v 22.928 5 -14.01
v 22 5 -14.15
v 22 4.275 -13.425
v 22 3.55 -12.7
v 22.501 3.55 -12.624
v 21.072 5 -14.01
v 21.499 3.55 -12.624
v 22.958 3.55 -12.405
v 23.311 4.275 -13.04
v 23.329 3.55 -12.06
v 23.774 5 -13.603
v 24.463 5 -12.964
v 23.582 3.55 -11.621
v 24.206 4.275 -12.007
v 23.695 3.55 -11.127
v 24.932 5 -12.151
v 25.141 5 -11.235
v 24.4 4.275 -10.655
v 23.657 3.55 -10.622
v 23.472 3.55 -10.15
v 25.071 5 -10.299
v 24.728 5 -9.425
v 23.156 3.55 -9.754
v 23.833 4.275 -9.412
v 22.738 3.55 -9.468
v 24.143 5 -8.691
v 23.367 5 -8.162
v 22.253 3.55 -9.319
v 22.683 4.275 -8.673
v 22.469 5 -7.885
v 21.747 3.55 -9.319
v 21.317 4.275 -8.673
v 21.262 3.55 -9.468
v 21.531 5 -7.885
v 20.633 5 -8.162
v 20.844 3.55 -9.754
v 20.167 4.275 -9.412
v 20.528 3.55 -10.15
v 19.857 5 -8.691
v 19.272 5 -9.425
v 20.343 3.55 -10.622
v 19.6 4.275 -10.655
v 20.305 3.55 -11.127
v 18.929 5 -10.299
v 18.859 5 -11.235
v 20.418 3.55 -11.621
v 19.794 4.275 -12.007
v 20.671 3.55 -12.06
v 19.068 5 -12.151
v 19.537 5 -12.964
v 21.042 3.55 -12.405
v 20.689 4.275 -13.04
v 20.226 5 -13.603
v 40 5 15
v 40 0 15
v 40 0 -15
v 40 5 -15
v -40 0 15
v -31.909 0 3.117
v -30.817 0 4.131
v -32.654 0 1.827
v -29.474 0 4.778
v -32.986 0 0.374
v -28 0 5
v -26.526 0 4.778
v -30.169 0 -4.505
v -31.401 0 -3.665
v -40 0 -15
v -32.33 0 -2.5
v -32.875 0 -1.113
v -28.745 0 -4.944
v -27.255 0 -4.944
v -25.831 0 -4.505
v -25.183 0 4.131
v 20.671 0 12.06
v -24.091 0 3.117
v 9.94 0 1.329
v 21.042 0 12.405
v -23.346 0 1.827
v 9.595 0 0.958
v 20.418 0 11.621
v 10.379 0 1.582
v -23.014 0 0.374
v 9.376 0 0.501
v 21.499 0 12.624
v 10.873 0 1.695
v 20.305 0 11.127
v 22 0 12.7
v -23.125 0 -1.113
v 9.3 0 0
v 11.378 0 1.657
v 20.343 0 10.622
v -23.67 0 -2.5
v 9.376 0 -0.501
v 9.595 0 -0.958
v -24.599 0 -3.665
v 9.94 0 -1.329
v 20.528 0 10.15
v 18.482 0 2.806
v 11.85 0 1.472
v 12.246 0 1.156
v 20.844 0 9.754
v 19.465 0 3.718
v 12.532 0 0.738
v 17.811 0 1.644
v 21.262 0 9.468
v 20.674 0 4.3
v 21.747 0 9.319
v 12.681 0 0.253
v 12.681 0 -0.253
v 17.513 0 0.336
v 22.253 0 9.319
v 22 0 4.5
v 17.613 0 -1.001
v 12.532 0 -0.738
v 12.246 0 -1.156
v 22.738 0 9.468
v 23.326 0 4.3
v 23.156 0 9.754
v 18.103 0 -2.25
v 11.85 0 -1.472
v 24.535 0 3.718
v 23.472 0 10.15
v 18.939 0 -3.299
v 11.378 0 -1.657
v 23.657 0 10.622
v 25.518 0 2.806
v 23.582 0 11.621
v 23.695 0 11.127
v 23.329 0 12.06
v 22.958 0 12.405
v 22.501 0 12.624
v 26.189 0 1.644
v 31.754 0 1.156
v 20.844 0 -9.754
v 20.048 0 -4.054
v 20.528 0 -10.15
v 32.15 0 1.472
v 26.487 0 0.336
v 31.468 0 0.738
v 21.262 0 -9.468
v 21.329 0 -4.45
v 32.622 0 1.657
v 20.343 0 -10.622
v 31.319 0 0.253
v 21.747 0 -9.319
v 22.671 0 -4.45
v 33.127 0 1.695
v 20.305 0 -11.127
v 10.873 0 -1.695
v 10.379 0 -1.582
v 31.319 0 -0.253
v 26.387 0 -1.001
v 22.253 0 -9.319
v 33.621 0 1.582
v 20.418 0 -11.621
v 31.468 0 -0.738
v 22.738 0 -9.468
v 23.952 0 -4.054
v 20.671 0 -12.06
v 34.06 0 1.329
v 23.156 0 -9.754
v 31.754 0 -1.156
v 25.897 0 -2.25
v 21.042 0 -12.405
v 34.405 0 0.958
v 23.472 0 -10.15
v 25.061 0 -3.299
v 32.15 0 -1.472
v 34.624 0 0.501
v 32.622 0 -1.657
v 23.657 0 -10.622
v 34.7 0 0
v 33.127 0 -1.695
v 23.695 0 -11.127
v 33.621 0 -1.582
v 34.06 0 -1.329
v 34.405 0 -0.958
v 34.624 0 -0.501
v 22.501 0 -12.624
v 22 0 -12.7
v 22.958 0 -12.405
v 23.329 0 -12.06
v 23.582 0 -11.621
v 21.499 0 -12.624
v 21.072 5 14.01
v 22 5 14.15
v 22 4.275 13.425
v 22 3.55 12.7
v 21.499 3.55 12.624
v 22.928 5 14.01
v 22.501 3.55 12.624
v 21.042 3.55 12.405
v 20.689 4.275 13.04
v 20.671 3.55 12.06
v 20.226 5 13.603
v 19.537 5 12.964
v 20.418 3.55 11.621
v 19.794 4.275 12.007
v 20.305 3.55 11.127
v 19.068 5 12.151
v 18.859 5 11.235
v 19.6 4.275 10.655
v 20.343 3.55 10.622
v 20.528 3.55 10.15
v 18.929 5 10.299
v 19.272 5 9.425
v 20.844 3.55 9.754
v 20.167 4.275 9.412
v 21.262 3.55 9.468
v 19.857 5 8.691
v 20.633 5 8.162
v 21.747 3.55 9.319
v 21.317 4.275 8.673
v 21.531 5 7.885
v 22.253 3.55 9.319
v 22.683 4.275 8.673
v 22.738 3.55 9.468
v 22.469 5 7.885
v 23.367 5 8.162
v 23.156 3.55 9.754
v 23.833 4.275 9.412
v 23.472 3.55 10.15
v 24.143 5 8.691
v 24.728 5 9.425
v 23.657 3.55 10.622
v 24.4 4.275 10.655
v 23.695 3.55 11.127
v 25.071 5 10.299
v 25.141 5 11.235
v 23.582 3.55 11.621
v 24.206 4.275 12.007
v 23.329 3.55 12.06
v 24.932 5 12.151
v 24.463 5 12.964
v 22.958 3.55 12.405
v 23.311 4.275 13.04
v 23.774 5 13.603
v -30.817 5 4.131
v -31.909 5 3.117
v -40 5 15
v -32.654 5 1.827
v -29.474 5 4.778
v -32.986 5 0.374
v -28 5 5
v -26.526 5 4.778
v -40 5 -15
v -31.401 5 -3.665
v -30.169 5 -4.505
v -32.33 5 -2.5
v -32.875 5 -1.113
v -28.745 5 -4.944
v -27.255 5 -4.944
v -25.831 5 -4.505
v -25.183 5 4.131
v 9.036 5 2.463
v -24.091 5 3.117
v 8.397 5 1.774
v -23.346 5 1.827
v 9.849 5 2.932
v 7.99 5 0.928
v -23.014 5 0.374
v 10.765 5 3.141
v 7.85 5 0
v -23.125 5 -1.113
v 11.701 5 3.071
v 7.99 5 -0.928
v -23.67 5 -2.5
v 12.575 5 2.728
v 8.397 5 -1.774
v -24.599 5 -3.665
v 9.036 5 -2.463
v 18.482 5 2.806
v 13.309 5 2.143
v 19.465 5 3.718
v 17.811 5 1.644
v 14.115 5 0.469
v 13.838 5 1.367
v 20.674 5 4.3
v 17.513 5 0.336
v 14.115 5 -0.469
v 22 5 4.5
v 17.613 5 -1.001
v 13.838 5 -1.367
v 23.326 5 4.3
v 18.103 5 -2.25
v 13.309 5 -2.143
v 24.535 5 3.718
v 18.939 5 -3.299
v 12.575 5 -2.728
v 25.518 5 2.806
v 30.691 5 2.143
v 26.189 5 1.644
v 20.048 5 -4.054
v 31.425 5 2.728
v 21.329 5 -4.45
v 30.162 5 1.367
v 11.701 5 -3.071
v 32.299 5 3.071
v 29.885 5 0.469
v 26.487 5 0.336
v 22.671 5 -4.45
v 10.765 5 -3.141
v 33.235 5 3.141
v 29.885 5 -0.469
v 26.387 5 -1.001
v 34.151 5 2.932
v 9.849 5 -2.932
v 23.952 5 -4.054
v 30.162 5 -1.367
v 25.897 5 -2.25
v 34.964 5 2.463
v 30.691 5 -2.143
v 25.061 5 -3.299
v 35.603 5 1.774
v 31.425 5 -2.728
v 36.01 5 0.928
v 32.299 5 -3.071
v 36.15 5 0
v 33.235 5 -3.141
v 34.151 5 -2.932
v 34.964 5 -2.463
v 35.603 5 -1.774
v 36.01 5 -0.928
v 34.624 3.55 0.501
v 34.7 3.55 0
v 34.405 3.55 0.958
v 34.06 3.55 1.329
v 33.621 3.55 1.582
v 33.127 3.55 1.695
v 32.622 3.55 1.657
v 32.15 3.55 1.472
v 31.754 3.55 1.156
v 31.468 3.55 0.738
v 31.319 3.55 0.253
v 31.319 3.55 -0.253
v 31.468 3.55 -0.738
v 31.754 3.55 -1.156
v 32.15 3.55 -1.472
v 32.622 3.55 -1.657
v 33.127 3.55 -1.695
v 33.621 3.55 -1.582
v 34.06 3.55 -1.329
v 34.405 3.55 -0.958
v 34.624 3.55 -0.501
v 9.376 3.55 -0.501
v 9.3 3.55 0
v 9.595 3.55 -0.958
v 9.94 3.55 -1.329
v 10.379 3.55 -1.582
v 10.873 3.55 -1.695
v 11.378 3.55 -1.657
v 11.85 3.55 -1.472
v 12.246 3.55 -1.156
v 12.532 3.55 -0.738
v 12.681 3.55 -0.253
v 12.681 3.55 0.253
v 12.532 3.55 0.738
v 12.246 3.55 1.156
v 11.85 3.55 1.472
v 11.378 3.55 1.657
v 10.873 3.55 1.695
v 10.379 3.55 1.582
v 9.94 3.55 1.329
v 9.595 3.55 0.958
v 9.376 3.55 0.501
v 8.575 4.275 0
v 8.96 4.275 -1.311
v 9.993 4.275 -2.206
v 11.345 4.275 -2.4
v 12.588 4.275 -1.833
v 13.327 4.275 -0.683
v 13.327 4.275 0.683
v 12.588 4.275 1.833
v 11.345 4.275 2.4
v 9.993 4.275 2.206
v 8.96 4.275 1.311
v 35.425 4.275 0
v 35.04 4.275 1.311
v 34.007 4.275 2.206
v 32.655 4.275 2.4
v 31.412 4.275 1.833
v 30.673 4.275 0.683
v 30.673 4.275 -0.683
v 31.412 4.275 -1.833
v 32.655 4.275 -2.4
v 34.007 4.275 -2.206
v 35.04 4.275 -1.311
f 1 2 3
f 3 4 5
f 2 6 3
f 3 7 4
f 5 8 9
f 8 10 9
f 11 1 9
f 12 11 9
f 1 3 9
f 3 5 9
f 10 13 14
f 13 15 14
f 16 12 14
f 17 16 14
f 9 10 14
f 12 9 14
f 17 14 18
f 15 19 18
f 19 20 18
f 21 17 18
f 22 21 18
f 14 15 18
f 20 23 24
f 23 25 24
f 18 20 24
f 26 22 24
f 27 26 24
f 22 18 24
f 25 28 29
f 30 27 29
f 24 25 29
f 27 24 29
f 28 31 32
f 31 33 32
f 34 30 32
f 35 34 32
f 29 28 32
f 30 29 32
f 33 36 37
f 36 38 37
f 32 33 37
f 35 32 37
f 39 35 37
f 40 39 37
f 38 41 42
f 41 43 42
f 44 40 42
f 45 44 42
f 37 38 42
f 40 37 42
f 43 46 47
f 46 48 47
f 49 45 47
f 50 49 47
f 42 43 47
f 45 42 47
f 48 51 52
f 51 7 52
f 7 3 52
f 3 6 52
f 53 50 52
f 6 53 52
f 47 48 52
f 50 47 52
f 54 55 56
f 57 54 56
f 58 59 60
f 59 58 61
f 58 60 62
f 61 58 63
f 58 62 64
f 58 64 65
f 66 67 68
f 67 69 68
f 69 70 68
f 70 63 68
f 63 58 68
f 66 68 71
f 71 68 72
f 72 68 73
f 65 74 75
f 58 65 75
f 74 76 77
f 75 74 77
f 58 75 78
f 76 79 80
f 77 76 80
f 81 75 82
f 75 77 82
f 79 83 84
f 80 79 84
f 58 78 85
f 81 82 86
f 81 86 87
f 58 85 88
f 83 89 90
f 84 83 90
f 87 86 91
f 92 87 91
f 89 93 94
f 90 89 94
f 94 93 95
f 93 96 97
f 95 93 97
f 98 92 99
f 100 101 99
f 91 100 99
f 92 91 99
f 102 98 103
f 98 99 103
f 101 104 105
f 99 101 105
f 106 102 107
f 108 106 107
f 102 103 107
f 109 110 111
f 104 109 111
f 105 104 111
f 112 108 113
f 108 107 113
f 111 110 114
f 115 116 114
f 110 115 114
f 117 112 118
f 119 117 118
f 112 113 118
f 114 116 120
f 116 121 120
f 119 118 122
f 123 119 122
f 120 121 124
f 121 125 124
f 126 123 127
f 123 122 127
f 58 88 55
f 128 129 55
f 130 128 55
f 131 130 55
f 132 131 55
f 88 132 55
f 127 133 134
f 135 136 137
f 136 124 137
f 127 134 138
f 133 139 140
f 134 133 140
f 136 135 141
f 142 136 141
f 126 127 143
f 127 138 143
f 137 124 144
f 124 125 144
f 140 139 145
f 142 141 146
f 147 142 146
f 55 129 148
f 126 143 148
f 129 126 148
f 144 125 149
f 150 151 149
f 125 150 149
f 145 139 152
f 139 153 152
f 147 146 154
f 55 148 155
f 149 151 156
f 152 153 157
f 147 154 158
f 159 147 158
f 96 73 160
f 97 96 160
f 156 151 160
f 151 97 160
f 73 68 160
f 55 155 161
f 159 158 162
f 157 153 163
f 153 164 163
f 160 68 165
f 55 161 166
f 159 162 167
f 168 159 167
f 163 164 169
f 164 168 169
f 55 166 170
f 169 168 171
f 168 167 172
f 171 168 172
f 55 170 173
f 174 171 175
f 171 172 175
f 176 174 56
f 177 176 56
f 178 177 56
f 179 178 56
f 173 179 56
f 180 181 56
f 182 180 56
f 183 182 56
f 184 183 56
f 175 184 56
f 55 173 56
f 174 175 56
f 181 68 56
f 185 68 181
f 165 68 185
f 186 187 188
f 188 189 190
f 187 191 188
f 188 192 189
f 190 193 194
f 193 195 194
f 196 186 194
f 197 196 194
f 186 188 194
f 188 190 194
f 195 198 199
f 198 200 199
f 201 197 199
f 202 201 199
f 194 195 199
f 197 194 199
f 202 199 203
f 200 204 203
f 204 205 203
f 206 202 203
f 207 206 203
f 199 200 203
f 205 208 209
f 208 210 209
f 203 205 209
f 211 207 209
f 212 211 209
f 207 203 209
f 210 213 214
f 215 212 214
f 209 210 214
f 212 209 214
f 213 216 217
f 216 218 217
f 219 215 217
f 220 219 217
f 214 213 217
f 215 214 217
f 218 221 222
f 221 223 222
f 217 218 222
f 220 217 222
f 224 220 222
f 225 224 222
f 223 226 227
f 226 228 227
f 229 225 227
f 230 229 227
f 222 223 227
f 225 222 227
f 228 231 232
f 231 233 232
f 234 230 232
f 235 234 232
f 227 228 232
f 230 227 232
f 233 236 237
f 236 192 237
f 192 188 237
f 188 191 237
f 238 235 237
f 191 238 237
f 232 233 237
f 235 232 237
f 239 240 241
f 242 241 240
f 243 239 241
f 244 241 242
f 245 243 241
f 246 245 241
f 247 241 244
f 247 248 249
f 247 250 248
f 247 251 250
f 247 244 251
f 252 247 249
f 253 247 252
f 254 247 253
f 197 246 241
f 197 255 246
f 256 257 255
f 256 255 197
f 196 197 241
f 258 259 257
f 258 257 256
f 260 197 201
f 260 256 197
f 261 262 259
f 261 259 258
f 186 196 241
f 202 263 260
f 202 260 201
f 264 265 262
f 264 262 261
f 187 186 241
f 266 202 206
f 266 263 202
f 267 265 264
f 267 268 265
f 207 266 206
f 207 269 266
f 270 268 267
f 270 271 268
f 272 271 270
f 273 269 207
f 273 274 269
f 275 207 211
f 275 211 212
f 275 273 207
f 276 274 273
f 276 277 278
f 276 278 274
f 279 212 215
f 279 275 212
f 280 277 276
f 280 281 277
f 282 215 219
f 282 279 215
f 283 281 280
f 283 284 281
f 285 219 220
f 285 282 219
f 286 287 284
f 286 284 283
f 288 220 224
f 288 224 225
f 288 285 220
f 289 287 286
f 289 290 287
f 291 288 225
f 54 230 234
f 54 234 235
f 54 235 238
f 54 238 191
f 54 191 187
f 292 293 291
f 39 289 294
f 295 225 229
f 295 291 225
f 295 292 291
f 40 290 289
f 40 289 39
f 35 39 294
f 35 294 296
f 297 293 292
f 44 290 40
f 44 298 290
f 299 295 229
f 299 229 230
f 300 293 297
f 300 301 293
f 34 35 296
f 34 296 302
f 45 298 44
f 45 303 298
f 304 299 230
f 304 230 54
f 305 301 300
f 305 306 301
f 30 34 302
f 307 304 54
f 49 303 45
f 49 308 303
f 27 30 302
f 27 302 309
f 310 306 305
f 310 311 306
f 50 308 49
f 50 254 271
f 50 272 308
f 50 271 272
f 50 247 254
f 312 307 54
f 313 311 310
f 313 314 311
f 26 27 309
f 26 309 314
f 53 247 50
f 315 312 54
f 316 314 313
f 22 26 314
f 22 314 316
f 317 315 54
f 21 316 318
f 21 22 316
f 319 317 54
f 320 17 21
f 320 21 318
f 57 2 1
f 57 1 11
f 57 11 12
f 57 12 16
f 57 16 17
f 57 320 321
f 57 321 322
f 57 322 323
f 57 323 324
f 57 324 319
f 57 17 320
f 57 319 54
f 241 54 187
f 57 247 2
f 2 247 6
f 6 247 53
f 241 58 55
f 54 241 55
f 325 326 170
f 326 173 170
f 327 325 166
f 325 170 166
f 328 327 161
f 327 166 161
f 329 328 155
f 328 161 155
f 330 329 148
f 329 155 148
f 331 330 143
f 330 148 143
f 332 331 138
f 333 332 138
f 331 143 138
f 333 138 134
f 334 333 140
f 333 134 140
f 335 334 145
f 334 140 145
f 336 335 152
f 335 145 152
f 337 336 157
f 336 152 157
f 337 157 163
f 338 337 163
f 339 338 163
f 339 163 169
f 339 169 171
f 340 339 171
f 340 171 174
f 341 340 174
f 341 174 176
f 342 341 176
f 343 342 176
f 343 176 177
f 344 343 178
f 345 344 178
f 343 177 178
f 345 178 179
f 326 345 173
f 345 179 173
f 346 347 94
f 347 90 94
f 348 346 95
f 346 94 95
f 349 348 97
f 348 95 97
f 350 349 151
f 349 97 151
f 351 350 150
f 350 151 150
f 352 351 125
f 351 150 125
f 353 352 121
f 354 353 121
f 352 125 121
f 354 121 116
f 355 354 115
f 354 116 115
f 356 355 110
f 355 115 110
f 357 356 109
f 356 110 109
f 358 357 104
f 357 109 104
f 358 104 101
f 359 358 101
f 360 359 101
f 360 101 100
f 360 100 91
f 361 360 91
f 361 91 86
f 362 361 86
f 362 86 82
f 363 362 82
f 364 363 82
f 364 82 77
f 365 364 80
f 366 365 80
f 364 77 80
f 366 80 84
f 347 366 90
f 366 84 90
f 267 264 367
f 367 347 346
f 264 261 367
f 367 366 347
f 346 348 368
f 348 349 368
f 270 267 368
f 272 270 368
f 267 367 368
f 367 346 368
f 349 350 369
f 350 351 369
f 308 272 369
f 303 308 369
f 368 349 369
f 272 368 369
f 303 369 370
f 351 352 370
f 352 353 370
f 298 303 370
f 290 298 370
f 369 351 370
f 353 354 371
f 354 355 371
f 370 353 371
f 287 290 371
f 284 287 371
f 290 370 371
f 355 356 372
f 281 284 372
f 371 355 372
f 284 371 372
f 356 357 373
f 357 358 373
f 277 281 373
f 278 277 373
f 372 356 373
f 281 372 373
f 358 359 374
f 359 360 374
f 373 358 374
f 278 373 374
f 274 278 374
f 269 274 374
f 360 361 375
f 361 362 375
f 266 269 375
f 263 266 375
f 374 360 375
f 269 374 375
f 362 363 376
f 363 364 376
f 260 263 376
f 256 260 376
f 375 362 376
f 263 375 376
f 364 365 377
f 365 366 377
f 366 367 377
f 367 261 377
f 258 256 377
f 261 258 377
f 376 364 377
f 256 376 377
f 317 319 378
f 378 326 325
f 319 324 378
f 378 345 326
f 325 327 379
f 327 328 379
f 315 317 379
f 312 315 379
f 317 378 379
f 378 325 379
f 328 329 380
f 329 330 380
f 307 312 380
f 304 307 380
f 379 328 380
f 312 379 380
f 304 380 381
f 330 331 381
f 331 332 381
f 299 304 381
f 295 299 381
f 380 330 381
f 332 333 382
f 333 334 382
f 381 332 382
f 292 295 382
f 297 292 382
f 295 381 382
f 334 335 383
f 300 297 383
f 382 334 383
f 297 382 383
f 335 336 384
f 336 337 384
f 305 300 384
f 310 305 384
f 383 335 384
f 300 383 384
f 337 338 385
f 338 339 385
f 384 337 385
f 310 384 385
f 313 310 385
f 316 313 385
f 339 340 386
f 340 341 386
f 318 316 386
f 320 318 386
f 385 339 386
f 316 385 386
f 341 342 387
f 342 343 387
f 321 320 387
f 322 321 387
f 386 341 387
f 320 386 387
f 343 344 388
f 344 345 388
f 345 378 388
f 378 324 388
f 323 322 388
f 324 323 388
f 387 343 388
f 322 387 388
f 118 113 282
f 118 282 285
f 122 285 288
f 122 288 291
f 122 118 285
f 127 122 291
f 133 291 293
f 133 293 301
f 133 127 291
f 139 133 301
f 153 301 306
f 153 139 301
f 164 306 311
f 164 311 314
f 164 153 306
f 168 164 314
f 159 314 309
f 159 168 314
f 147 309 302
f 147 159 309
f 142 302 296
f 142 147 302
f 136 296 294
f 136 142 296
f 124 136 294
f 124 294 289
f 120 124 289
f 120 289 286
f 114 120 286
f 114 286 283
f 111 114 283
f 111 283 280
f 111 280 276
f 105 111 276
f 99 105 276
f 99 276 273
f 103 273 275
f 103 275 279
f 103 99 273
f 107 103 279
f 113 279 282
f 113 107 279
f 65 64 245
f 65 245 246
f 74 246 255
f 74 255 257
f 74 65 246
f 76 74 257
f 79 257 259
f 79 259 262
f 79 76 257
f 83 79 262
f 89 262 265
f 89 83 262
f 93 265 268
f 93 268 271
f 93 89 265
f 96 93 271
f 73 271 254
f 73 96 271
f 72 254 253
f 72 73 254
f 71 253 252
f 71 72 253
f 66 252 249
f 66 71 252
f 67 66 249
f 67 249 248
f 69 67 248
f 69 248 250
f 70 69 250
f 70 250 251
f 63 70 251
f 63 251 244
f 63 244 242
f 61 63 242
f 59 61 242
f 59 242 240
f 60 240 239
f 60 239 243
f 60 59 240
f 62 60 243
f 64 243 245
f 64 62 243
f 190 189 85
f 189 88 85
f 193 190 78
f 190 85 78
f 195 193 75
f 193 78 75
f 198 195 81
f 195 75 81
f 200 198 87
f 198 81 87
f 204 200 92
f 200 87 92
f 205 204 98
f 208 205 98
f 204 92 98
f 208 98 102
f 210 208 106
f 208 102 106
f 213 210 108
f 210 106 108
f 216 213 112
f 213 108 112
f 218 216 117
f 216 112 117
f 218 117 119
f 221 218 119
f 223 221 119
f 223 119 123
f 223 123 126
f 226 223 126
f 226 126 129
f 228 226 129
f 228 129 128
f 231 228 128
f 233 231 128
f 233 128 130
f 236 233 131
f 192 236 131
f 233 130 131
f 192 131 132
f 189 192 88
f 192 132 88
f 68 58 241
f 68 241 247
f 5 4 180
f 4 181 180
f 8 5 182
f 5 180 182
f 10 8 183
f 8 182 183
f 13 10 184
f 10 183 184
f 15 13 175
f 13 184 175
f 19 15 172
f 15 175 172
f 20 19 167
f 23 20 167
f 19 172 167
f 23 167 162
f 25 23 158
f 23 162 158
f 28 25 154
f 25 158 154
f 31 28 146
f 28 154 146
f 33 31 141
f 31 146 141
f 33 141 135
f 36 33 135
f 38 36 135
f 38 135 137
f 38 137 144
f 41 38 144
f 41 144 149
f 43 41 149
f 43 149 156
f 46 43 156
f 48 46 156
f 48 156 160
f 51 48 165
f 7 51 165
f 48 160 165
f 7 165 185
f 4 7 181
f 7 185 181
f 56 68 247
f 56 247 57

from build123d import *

# Parameters (mm, degrees)
SKETCH1_W                                           = 80
SKETCH1_H                                           = 30
SKETCH1_R                                           = 4.5
SKETCH1_R_2                                         = 5
BOSS_EXTRUDE1_DEPTH                                 = 5
CSK_FOR_M3_COUNTERSUNK_FLAT_HEAD_SCREW1_D           = 3.4
CSK_FOR_M3_COUNTERSUNK_FLAT_HEAD_SCREW1_CSINK_D     = 6.3
CSK_FOR_M3_COUNTERSUNK_FLAT_HEAD_SCREW1_CSINK_ANGLE = 90
CIRPATTERN1_COUNT                                   = 4


with BuildPart() as part:
    # Sketch1 → Boss-Extrude1 (new body)
    with BuildSketch(Plane(origin=(0, 0, 0), x_dir=(1, 0, 0), z_dir=(0, 1, 0))):
        Rectangle(SKETCH1_W, SKETCH1_H)
        with Locations(Location((22, 0, 0), (0, 0, 270))):
            Circle(SKETCH1_R, mode=Mode.SUBTRACT)
        with Locations(Location((-28, 0, 0), (0, 0, 270))):
            Circle(SKETCH1_R_2, mode=Mode.SUBTRACT)
    extrude(amount=BOSS_EXTRUDE1_DEPTH)

    # CSK for M3 Countersunk Flat Head Screw1 (through all)
    with Locations(Plane(origin=(0, 5, 0), x_dir=(1, 0, 0), z_dir=(0, 1, 0))):
        with Locations((11, 0)):
            csk_for_m3_countersunk_flat_head_screw1 = CounterSinkHole(CSK_FOR_M3_COUNTERSUNK_FLAT_HEAD_SCREW1_D / 2, CSK_FOR_M3_COUNTERSUNK_FLAT_HEAD_SCREW1_CSINK_D / 2, counter_sink_angle=CSK_FOR_M3_COUNTERSUNK_FLAT_HEAD_SCREW1_CSINK_ANGLE)

    # CirPattern1: CSK for M3 Countersunk Flat Head Screw1 ×4 about axis
    cirpattern1_axis = Axis((22, 0, 0), (0, 1, 0))
    for i in range(1, CIRPATTERN1_COUNT):
        add(csk_for_m3_countersunk_flat_head_screw1.rotate(cirpattern1_axis, i * 360 / CIRPATTERN1_COUNT), mode=Mode.SUBTRACT)


solid = part.part
